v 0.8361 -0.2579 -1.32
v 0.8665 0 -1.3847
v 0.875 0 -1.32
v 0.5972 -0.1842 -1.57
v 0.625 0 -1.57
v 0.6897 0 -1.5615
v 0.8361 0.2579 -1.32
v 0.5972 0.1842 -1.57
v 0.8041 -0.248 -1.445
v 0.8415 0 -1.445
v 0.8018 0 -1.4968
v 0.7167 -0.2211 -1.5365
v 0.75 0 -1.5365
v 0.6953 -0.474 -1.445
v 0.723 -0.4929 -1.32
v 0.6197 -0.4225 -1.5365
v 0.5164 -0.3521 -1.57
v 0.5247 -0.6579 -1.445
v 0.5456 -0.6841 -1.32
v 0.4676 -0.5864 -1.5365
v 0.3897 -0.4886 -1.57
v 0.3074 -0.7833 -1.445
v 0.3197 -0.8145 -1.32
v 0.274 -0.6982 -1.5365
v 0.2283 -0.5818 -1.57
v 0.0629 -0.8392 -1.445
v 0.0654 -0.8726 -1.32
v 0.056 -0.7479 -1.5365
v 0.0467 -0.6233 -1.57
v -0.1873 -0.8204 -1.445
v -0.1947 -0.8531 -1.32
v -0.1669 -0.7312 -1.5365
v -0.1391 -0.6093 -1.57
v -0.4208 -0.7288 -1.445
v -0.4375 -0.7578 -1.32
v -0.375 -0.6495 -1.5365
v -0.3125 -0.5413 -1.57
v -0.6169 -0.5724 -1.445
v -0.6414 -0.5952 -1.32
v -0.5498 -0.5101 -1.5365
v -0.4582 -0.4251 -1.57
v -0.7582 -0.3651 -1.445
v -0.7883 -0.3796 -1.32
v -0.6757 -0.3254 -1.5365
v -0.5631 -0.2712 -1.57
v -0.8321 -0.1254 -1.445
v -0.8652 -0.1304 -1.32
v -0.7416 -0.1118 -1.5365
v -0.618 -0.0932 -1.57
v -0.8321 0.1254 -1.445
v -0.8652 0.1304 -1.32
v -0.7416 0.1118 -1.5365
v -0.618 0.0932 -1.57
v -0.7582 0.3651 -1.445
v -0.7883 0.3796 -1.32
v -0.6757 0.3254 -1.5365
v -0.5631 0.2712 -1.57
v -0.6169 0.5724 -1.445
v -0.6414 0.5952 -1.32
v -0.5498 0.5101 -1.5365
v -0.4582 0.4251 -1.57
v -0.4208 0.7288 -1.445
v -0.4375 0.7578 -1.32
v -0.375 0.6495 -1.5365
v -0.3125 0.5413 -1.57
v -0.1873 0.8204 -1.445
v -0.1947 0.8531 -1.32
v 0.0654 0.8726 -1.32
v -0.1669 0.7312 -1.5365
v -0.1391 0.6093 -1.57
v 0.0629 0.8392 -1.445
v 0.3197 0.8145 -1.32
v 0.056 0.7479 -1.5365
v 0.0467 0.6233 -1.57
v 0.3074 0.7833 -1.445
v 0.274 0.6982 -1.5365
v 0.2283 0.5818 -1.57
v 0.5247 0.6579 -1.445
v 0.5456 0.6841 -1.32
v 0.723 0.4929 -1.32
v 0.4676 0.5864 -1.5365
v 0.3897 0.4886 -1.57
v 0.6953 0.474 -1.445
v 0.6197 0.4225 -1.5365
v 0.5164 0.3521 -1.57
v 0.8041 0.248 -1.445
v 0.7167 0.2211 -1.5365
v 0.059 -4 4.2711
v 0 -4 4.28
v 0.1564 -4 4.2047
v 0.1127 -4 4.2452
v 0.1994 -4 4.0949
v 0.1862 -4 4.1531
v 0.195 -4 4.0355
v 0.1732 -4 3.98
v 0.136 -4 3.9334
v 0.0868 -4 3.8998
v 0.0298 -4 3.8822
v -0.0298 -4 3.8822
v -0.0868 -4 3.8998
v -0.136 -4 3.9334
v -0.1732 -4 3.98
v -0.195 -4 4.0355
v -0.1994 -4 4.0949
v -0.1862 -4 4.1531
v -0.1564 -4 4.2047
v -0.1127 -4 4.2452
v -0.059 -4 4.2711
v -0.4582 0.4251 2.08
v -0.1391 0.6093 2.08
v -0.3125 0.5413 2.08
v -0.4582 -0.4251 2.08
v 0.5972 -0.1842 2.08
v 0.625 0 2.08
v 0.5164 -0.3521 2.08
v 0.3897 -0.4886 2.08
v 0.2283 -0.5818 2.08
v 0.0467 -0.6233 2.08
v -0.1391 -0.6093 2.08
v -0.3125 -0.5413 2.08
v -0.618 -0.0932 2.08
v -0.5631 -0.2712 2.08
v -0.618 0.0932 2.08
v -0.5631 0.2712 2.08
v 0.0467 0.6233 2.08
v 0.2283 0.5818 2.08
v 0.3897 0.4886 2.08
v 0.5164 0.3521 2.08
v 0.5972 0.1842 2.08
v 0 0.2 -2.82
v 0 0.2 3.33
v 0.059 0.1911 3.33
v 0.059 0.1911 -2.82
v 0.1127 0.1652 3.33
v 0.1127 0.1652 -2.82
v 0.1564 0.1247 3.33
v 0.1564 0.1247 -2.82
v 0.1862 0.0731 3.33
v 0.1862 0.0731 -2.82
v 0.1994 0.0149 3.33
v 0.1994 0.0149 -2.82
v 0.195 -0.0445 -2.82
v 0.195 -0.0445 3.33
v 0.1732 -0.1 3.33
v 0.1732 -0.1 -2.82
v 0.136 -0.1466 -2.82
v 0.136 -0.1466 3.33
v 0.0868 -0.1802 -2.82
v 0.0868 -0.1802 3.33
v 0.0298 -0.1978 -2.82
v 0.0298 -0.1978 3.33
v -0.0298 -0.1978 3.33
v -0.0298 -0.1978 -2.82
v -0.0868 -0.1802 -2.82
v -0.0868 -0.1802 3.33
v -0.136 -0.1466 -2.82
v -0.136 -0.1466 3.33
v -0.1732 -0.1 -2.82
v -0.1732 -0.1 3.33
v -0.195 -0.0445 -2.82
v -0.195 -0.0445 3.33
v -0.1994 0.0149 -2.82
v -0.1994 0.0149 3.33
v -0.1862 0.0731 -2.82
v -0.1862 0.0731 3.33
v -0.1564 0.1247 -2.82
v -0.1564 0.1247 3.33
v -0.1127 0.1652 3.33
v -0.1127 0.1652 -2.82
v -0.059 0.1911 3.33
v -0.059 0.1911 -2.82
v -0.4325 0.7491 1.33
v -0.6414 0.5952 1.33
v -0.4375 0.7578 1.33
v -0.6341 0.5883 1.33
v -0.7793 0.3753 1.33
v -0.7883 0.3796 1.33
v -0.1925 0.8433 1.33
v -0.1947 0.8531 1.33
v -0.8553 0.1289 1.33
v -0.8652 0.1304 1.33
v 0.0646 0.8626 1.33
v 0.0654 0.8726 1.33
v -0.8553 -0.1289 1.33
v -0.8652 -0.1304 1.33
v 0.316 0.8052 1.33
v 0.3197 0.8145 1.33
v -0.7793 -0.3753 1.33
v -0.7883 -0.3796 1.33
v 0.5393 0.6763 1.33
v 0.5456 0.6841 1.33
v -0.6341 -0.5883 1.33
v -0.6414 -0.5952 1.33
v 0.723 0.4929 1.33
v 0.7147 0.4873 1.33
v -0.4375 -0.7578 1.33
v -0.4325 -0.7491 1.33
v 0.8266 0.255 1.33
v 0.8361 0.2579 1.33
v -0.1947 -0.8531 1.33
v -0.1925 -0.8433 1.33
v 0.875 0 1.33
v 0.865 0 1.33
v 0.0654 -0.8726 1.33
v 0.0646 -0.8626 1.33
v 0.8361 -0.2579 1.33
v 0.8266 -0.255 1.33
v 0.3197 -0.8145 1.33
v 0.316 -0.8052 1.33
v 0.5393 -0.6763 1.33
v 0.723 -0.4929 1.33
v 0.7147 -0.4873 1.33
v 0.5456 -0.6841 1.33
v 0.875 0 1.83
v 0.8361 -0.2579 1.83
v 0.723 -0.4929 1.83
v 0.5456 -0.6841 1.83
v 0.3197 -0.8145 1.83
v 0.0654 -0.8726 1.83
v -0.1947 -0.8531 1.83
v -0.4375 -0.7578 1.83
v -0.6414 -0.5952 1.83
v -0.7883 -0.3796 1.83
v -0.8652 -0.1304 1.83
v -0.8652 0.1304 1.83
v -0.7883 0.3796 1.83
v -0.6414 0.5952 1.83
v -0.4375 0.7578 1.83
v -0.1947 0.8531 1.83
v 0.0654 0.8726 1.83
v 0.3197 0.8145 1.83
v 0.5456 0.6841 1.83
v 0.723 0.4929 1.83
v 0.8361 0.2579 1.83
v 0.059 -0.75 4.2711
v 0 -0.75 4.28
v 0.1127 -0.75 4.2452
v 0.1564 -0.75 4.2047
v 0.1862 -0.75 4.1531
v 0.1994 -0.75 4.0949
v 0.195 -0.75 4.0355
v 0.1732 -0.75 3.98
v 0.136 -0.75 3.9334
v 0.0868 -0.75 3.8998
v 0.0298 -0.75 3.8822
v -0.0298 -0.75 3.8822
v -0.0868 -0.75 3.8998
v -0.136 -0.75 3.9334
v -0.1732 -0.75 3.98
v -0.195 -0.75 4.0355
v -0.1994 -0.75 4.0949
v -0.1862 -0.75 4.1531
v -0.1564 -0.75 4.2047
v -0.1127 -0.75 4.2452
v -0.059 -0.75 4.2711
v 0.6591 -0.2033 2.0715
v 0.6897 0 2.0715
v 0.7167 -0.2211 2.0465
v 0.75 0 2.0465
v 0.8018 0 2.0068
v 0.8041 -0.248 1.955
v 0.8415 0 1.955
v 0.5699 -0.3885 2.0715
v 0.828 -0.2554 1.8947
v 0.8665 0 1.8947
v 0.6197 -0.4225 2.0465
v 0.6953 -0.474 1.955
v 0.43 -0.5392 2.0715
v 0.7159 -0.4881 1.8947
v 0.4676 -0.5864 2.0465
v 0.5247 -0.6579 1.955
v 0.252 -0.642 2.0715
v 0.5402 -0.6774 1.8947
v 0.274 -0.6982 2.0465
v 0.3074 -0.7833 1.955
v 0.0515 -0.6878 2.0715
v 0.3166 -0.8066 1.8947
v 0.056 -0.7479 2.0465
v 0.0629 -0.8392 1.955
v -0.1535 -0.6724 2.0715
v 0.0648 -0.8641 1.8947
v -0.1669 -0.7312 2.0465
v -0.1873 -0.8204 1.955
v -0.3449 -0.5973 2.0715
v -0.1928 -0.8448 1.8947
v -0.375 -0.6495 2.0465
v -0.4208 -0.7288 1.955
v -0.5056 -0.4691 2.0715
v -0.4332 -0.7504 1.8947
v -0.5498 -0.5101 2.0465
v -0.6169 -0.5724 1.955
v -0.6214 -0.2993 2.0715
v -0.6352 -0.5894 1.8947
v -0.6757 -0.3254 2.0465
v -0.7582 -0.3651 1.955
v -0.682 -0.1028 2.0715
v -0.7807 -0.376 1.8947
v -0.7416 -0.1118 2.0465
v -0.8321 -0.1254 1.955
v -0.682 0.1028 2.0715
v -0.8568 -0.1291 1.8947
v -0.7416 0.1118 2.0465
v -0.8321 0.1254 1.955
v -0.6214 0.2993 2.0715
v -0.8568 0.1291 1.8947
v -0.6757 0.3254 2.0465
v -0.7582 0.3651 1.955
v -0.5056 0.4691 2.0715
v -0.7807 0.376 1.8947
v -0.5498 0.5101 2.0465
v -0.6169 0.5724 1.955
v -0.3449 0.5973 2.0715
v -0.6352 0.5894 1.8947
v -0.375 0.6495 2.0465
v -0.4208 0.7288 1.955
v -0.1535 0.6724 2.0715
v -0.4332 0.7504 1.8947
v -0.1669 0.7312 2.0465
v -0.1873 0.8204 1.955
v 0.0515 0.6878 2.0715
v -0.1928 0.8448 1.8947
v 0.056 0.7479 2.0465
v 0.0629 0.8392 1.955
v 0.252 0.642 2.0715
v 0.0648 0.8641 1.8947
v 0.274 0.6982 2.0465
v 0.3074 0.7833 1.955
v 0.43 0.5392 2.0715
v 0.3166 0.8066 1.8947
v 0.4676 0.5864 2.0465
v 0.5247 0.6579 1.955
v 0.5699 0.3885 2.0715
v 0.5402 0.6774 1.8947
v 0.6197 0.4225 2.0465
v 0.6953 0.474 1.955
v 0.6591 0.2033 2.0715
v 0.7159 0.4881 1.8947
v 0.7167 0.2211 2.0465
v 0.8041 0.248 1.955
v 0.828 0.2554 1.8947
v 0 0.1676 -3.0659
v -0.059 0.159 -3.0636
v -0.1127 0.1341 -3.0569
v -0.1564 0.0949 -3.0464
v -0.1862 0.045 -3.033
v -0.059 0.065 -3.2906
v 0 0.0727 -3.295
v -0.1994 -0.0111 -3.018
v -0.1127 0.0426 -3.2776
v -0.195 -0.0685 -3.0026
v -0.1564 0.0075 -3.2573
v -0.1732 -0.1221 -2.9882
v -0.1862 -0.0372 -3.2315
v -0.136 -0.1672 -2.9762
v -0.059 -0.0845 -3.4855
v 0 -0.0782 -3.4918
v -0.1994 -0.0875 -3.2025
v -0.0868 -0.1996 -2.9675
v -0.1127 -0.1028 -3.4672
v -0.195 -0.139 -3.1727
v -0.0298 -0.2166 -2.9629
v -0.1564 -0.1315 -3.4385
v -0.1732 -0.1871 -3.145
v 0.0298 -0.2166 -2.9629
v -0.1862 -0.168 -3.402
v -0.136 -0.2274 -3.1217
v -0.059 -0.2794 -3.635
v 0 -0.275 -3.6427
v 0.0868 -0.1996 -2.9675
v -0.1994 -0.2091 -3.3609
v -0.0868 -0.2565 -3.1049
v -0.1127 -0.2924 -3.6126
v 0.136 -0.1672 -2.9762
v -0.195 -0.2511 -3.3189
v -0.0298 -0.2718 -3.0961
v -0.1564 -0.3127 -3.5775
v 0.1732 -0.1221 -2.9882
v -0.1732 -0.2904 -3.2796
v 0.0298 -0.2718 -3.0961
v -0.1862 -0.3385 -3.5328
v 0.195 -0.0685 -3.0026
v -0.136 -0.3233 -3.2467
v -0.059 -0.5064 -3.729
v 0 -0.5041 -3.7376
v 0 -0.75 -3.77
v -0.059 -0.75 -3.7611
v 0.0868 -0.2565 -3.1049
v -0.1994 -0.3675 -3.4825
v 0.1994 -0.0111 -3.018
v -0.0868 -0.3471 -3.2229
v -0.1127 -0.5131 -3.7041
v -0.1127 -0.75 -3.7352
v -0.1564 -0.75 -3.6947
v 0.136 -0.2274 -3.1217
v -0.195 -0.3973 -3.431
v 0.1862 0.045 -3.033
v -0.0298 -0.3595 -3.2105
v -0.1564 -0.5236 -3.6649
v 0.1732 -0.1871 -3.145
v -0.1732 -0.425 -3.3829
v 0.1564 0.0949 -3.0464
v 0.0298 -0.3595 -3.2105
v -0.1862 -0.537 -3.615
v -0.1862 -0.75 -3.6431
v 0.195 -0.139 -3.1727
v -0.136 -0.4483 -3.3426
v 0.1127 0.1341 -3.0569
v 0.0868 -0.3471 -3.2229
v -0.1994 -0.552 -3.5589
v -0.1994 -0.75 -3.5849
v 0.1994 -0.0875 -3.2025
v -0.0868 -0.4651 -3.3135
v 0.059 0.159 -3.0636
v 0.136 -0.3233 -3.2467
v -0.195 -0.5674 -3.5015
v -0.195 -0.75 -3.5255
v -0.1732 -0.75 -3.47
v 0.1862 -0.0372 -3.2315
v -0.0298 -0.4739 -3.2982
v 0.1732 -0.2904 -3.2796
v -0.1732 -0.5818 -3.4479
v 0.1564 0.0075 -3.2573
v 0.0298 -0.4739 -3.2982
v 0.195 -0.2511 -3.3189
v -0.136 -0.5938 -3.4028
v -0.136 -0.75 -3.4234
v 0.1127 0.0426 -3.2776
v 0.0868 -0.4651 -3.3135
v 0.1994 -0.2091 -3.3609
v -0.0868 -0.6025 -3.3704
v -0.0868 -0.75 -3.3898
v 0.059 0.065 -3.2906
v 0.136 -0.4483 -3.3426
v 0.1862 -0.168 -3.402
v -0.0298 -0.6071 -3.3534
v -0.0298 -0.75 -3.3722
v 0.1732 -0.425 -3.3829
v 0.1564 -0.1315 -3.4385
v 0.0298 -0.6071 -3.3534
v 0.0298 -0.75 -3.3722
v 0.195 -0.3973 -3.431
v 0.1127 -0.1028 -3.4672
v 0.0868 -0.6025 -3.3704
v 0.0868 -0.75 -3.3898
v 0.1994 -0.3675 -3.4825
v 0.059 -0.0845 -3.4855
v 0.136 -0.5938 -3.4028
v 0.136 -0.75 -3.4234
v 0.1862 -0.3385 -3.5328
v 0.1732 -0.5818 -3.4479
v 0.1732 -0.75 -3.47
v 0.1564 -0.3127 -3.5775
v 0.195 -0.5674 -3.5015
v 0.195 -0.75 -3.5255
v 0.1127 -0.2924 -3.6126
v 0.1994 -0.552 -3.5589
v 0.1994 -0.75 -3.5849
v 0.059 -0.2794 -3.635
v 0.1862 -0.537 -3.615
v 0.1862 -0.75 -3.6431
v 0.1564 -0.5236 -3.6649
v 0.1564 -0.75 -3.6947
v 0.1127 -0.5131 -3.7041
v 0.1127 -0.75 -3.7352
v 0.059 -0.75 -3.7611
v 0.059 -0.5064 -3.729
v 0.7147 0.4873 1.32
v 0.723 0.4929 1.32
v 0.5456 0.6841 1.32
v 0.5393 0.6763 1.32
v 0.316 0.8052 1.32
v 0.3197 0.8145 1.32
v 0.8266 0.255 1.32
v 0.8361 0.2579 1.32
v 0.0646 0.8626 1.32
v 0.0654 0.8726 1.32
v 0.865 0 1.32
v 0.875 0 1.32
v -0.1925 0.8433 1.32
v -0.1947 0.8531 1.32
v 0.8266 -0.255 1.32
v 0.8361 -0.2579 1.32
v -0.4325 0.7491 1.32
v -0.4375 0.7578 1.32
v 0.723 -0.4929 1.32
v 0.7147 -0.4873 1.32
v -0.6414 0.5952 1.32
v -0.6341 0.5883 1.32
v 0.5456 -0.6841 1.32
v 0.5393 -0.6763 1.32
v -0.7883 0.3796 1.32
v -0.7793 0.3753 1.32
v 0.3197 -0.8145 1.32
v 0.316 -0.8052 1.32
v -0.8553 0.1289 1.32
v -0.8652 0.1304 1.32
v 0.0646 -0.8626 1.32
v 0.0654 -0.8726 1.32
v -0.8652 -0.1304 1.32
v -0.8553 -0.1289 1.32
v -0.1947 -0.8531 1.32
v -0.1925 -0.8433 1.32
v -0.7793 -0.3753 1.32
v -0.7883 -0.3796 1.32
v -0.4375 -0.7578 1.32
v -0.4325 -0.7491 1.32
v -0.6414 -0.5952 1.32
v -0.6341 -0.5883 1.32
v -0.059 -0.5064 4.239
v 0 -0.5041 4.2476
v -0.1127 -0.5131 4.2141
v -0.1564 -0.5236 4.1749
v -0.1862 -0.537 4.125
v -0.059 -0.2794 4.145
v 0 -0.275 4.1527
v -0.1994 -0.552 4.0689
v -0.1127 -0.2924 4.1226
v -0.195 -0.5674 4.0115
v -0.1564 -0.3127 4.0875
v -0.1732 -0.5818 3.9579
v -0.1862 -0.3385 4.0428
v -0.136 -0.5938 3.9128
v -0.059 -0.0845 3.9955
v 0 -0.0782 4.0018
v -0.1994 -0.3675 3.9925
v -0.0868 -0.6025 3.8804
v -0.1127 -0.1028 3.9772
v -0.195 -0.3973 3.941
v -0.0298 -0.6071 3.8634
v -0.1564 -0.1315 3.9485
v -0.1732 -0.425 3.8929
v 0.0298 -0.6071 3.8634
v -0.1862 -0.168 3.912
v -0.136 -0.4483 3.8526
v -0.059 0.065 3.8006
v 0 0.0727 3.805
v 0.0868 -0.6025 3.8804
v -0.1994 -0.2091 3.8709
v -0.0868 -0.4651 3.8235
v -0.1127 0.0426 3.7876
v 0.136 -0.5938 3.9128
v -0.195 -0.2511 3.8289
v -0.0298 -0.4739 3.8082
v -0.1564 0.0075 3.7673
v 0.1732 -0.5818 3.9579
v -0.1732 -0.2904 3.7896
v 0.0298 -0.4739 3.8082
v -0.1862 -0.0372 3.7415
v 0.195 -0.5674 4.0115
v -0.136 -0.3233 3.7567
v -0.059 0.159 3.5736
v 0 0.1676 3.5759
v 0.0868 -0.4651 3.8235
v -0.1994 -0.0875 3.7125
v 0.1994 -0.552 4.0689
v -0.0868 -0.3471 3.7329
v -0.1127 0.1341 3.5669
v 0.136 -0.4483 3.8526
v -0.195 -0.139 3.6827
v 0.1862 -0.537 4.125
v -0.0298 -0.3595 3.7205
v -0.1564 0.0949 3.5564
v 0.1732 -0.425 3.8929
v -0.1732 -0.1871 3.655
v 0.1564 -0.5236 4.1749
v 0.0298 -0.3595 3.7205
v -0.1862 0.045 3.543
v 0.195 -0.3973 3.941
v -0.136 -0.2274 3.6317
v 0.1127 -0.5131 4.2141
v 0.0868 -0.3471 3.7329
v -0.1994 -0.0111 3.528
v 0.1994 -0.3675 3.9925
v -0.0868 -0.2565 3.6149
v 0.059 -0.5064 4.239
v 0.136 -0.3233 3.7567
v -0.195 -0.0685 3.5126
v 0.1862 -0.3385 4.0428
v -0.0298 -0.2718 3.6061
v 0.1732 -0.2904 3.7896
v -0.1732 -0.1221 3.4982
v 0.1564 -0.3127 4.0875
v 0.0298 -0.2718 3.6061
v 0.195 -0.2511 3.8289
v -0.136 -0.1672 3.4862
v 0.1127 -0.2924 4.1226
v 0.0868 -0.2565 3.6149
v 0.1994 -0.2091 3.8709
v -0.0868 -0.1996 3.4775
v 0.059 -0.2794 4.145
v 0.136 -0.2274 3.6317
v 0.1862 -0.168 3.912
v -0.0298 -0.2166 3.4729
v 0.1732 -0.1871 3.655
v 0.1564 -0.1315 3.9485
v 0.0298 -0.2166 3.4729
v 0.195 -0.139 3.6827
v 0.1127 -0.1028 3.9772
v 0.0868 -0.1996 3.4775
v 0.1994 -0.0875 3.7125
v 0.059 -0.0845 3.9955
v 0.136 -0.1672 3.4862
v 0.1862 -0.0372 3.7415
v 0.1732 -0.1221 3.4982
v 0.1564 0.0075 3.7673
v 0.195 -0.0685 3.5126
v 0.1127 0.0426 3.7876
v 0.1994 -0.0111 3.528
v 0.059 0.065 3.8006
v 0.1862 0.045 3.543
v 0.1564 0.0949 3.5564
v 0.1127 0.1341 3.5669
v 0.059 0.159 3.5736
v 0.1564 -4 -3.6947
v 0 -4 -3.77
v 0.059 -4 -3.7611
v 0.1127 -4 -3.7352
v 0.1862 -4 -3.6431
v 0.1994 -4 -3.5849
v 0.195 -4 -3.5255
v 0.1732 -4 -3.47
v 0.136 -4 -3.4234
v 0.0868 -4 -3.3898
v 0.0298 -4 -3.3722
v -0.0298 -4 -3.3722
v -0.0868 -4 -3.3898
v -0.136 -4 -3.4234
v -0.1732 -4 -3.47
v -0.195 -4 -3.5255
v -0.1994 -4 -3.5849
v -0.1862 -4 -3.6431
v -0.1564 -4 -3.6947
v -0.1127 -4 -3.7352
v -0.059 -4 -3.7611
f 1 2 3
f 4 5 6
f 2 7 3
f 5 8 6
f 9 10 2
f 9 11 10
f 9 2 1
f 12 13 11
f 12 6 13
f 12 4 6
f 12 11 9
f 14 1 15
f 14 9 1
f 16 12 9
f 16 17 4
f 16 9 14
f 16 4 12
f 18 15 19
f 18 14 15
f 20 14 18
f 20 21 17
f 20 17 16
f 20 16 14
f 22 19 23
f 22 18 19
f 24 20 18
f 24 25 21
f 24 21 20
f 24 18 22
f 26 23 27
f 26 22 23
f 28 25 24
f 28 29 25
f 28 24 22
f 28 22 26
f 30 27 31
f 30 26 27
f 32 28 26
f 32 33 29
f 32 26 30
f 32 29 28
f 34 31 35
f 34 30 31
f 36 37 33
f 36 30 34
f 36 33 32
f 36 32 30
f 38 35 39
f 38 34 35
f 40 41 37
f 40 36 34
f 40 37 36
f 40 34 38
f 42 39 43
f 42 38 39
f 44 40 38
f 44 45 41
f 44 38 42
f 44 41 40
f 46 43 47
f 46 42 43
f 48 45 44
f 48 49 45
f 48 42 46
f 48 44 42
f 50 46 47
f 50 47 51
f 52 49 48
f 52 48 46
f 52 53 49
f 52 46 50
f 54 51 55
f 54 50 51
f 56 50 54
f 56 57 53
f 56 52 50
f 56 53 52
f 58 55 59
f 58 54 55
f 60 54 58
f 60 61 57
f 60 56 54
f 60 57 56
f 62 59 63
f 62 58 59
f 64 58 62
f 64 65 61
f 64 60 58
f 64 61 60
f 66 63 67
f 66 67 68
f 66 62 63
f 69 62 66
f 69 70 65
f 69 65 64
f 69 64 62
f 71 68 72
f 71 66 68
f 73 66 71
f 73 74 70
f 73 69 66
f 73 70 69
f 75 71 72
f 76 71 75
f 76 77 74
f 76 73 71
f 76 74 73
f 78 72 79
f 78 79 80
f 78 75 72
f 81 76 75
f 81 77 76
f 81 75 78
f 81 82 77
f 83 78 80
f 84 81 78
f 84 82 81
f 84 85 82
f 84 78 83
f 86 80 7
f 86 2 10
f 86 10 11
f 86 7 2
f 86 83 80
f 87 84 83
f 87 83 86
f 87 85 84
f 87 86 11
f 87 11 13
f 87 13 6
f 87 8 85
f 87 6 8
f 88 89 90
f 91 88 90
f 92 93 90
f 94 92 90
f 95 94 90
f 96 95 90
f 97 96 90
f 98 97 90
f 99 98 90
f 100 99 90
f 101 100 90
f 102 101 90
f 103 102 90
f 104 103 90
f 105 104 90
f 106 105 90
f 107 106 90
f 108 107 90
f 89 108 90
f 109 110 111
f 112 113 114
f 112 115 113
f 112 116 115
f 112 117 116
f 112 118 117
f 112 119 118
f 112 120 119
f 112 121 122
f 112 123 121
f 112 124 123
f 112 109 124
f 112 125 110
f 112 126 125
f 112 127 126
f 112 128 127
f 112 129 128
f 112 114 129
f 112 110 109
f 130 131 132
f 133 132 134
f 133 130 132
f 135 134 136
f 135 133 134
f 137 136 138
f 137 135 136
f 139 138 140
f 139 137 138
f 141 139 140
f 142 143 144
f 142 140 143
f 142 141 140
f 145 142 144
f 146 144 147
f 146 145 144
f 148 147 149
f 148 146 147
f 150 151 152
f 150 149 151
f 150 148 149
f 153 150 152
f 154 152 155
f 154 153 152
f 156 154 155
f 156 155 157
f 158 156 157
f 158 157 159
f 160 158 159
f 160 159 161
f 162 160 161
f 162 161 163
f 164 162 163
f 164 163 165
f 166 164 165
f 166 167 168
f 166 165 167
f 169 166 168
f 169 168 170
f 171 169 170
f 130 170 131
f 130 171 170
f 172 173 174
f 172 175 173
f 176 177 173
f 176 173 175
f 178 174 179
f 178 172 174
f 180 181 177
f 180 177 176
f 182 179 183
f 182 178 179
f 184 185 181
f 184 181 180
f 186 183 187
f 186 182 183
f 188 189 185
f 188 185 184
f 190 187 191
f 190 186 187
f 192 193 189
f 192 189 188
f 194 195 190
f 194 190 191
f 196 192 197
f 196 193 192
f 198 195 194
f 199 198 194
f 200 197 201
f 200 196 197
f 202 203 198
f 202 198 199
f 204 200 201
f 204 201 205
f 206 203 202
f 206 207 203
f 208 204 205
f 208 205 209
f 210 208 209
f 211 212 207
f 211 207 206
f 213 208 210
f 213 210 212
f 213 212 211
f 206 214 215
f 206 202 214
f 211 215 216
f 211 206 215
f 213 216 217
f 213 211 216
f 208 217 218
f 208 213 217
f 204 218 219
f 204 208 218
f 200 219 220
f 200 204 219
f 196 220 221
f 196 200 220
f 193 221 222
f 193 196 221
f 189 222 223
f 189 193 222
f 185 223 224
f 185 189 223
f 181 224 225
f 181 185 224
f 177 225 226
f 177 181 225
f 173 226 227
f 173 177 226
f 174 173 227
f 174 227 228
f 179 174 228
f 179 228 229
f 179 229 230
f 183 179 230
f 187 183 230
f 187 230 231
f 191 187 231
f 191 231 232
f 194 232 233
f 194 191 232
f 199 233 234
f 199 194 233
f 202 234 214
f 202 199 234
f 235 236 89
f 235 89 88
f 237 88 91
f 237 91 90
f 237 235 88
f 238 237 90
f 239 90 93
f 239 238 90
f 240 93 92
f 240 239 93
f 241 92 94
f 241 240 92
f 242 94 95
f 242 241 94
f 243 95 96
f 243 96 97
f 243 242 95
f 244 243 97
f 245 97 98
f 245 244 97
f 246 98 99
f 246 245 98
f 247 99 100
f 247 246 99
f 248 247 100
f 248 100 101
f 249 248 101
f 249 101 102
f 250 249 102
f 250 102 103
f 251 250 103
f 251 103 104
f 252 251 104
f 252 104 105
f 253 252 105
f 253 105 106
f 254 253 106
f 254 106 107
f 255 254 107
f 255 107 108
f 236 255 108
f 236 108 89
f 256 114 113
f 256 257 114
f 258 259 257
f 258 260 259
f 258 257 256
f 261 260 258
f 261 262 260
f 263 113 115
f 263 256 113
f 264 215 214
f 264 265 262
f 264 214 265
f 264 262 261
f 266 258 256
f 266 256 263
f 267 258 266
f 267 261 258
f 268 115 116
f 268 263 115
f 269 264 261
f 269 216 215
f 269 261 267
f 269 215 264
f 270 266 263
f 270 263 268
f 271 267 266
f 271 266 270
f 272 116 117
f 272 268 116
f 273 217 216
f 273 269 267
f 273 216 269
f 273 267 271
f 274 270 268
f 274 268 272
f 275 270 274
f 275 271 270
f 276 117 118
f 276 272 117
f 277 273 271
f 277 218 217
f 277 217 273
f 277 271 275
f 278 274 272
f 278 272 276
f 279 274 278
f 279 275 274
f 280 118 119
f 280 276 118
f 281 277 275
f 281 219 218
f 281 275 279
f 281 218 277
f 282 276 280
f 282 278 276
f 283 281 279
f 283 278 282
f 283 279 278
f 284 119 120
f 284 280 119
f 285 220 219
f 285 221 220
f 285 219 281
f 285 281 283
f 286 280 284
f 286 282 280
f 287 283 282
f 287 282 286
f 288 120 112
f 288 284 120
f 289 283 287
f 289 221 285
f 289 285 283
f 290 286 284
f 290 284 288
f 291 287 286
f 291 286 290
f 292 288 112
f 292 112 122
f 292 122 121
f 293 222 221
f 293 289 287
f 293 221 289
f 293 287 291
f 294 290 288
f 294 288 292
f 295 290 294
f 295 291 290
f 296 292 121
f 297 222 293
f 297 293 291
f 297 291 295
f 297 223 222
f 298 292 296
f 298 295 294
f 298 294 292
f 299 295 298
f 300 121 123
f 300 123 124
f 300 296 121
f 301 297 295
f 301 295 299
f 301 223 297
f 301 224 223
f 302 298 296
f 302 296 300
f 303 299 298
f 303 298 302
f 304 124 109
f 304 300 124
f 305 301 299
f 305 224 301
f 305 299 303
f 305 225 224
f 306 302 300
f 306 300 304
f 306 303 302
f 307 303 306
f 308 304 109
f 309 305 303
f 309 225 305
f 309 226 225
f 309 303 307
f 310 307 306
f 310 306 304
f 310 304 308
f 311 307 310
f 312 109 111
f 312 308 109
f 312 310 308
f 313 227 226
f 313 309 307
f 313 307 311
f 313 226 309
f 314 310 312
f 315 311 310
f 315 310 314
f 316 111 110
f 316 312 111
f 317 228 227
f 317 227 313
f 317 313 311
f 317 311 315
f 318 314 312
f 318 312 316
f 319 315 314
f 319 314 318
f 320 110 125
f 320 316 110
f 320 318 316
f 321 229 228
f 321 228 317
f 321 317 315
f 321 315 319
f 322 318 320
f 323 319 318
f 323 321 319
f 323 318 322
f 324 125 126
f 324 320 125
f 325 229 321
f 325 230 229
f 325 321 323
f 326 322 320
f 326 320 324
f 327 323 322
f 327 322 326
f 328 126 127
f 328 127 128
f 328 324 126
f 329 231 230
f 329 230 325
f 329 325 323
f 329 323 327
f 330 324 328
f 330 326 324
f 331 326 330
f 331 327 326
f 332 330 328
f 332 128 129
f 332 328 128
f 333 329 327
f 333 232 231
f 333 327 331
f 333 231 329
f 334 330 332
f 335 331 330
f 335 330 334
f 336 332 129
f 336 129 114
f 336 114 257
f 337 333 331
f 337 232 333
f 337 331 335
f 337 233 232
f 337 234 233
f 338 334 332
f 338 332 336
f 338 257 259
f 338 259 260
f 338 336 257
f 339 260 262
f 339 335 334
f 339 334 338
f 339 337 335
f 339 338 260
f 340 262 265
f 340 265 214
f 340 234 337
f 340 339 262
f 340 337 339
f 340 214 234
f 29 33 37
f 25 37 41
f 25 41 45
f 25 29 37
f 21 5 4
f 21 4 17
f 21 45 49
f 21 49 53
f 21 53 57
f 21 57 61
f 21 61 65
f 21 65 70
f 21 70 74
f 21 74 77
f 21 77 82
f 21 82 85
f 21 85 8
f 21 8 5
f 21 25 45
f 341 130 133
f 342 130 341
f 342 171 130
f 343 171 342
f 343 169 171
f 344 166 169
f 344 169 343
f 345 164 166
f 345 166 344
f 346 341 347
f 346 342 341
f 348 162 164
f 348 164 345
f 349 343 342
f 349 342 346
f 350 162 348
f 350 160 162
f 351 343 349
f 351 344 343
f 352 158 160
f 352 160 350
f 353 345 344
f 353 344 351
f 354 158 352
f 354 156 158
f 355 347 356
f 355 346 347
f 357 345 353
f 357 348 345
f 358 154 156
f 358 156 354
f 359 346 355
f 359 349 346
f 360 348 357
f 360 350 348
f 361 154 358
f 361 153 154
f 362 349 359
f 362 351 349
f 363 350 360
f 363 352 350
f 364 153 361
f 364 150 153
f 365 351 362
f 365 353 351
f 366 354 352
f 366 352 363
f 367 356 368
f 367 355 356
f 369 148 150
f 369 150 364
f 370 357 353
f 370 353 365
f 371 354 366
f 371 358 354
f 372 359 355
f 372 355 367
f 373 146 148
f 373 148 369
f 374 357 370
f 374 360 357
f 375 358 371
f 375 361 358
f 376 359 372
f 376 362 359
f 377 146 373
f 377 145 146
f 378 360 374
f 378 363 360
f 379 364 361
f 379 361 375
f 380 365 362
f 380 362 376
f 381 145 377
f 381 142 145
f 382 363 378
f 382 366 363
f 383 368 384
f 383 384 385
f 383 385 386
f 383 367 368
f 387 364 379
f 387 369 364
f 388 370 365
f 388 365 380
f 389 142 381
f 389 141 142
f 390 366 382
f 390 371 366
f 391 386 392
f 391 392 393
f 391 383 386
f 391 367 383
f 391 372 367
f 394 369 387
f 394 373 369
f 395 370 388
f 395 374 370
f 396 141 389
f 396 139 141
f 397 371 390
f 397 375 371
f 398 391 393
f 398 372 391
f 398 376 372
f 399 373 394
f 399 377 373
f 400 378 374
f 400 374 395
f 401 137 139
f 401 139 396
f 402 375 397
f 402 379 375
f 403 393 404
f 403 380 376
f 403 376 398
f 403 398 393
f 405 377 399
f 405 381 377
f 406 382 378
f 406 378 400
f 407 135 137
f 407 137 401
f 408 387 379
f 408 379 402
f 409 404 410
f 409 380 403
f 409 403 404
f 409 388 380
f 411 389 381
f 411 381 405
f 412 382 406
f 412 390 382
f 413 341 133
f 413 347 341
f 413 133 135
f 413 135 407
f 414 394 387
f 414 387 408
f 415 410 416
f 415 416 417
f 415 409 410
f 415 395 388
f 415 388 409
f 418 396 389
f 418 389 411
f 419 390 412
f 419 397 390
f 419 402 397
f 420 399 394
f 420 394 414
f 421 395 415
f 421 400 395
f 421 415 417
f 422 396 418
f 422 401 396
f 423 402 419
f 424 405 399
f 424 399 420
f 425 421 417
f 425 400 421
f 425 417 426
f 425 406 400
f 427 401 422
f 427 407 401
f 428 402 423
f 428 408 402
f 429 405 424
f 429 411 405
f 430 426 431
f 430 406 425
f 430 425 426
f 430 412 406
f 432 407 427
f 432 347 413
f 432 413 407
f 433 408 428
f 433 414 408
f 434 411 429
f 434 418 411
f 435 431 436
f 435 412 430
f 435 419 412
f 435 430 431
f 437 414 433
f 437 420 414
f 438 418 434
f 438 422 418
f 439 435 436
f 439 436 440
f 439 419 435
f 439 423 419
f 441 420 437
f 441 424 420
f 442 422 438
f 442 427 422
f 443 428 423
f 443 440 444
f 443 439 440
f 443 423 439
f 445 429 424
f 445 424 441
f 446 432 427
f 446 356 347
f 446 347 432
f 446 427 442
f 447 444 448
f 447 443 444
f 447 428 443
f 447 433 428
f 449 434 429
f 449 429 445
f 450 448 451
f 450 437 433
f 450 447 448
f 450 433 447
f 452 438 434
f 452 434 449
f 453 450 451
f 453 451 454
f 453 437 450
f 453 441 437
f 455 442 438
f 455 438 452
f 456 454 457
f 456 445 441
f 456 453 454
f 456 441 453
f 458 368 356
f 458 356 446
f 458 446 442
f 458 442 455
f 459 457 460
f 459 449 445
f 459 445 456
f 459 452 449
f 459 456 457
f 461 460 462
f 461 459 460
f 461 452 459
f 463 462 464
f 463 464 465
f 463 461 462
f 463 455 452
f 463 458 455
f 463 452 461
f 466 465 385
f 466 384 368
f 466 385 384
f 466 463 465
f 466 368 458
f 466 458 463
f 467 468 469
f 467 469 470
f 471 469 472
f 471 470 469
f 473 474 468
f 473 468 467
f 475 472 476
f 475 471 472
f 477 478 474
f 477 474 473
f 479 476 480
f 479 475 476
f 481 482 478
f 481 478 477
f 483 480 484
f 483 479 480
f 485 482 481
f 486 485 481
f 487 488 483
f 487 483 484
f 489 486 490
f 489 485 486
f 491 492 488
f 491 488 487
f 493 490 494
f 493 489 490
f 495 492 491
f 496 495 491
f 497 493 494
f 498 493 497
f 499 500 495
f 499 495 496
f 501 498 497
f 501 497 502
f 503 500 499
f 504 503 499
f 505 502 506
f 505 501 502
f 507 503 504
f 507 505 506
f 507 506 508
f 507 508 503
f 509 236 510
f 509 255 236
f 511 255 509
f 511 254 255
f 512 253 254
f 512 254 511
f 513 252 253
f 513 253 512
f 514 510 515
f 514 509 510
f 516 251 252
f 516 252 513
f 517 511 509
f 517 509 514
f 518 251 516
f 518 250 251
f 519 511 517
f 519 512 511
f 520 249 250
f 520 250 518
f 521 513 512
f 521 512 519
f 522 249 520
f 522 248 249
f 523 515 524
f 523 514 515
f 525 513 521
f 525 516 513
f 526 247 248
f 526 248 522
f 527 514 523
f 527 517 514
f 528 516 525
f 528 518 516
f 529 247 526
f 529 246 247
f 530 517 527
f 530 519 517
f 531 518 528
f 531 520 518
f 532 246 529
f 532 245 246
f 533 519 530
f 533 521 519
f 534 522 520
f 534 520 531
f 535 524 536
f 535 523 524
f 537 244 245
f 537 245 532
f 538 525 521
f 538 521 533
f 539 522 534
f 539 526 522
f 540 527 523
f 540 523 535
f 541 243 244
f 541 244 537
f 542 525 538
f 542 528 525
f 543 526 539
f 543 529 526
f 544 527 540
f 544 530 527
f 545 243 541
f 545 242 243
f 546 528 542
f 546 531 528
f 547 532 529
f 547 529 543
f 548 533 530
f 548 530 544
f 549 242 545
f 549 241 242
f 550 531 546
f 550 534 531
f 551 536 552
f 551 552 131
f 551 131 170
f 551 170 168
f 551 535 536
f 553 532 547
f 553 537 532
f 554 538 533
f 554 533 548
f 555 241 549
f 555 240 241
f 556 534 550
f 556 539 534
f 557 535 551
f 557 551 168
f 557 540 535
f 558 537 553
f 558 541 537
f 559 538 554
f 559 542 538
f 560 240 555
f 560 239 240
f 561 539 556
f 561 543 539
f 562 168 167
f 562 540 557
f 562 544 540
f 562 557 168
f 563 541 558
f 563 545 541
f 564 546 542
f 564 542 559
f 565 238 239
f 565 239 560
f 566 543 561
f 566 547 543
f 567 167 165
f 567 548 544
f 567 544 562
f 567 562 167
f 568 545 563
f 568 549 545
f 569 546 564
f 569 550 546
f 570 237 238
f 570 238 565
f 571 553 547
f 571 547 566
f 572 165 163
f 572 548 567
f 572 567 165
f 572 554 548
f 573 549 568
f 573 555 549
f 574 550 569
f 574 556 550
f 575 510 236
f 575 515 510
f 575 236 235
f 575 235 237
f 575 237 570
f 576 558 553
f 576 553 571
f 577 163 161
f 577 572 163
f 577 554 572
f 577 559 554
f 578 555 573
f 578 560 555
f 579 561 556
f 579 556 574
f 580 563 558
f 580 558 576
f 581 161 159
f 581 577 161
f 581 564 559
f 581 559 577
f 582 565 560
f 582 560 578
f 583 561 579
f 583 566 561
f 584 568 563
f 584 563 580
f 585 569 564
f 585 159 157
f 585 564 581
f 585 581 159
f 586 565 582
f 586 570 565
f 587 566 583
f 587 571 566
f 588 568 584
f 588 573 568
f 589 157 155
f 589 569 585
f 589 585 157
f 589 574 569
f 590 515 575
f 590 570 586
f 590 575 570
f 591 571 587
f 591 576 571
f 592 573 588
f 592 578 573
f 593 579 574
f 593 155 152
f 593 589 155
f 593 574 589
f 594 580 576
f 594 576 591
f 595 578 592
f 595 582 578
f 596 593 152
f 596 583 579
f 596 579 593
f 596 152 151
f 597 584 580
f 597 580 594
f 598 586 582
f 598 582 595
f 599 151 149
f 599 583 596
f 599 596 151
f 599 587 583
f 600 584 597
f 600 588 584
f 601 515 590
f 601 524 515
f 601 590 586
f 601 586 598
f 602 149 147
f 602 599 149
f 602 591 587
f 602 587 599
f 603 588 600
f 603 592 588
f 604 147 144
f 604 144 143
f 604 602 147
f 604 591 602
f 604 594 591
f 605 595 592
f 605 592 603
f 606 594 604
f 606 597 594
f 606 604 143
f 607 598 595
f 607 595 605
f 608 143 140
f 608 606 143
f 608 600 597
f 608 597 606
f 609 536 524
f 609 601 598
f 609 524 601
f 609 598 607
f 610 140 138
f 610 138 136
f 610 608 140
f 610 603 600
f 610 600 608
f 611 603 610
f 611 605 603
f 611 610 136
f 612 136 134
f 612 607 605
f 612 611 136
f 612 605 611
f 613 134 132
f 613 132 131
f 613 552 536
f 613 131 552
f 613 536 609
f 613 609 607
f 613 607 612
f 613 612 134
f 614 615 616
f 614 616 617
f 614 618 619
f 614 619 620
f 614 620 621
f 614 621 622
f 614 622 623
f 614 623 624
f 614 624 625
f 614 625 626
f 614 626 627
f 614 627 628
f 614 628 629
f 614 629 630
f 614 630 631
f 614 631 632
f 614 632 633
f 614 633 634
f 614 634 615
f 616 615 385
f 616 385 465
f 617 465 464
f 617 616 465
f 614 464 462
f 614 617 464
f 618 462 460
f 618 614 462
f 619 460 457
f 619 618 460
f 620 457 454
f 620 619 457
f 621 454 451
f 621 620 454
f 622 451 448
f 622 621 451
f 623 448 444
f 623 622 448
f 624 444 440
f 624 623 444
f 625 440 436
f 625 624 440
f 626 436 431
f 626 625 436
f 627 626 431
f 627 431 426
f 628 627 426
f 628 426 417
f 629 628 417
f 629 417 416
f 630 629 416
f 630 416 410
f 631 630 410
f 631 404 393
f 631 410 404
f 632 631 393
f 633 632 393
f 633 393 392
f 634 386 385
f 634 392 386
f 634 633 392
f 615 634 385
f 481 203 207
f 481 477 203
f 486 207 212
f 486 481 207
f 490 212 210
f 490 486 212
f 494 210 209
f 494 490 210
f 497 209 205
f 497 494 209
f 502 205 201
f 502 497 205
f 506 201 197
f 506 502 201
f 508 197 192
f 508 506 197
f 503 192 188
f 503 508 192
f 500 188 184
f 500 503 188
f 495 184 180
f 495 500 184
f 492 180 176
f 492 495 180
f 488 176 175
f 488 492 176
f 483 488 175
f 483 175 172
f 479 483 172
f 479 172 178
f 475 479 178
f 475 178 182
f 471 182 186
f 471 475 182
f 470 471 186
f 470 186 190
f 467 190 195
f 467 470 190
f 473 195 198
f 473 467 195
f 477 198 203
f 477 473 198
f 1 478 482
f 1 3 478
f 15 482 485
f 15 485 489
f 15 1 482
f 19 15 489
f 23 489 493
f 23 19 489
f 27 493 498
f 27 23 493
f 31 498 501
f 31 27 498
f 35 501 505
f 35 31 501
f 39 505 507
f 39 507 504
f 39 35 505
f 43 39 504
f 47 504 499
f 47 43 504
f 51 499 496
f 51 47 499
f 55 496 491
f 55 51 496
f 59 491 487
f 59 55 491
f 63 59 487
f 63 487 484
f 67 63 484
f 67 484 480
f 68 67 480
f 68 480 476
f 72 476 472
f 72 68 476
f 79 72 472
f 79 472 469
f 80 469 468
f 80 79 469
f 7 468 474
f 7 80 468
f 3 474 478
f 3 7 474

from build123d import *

# Parameters (mm, degrees)
SWEEP1_PROFILE_R = 0.2


with BuildPart() as part:
    # Sketch1 → Revolve1 (revolve)
    with BuildSketch(Plane(origin=(0, 0, 0), x_dir=(0, 0, -1), z_dir=(1, 0, 0)), mode=Mode.PRIVATE) as revolve1_sk:
        with BuildLine():
            Line((-1.83, 0.875), (-1.33, 0.875))
            Line((-1.33, 0.875), (-1.33, 0.865))
            Line((-1.33, 0.865), (-1.32, 0.865))
            Line((-1.32, 0.865), (-1.32, 0.875))
            Line((-1.32, 0.875), (1.32, 0.875))
            ThreePointArc((1.32, 0.875), (1.496776695, 0.801776695), (1.57, 0.625))
            Line((1.57, 0.625), (1.57, 0))
            Line((1.57, 0), (-2.08, 0))
            Line((-2.08, 0), (-2.08, 0.625))
            ThreePointArc((-2.08, 0.625), (-2.006776695, 0.801776695), (-1.83, 0.875))
        make_face()
    revolve(revolve1_sk.sketch.rotate(Axis((0, 0, 2.08), (0, 0, -1)), 90), axis=Axis((0, 0, 2.08), (0, 0, -1)))


with BuildPart() as body_2:
    # Sweep1: sweep along a path in Sketch2
    with BuildLine(Plane(origin=(0, 0, 0), x_dir=(0, 0, -1), z_dir=(1, 0, 0))) as sweep1_path:
        Line((-4.08, -4), (-4.08, -0.75))
        ThreePointArc((-4.08, -0.75), (-3.860330086, -0.219669914), (-3.33, 0))
        Line((-3.33, 0), (0, 0))
        Line((0, 0), (2.82, 0))
        ThreePointArc((2.82, 0), (3.350330086, -0.219669914), (3.57, -0.75))
        Line((3.57, -0.75), (3.57, -4))
    # Sweep1 profile (on start of the path) → Sweep1 (sweep)
    with BuildSketch(Plane(origin=(0, -4, 4.08), x_dir=(0, 0, 1), z_dir=(0, 1, 0))):
        Circle(SWEEP1_PROFILE_R)
    sweep(path=sweep1_path.line)


solid = Compound([part.part, body_2.part])
